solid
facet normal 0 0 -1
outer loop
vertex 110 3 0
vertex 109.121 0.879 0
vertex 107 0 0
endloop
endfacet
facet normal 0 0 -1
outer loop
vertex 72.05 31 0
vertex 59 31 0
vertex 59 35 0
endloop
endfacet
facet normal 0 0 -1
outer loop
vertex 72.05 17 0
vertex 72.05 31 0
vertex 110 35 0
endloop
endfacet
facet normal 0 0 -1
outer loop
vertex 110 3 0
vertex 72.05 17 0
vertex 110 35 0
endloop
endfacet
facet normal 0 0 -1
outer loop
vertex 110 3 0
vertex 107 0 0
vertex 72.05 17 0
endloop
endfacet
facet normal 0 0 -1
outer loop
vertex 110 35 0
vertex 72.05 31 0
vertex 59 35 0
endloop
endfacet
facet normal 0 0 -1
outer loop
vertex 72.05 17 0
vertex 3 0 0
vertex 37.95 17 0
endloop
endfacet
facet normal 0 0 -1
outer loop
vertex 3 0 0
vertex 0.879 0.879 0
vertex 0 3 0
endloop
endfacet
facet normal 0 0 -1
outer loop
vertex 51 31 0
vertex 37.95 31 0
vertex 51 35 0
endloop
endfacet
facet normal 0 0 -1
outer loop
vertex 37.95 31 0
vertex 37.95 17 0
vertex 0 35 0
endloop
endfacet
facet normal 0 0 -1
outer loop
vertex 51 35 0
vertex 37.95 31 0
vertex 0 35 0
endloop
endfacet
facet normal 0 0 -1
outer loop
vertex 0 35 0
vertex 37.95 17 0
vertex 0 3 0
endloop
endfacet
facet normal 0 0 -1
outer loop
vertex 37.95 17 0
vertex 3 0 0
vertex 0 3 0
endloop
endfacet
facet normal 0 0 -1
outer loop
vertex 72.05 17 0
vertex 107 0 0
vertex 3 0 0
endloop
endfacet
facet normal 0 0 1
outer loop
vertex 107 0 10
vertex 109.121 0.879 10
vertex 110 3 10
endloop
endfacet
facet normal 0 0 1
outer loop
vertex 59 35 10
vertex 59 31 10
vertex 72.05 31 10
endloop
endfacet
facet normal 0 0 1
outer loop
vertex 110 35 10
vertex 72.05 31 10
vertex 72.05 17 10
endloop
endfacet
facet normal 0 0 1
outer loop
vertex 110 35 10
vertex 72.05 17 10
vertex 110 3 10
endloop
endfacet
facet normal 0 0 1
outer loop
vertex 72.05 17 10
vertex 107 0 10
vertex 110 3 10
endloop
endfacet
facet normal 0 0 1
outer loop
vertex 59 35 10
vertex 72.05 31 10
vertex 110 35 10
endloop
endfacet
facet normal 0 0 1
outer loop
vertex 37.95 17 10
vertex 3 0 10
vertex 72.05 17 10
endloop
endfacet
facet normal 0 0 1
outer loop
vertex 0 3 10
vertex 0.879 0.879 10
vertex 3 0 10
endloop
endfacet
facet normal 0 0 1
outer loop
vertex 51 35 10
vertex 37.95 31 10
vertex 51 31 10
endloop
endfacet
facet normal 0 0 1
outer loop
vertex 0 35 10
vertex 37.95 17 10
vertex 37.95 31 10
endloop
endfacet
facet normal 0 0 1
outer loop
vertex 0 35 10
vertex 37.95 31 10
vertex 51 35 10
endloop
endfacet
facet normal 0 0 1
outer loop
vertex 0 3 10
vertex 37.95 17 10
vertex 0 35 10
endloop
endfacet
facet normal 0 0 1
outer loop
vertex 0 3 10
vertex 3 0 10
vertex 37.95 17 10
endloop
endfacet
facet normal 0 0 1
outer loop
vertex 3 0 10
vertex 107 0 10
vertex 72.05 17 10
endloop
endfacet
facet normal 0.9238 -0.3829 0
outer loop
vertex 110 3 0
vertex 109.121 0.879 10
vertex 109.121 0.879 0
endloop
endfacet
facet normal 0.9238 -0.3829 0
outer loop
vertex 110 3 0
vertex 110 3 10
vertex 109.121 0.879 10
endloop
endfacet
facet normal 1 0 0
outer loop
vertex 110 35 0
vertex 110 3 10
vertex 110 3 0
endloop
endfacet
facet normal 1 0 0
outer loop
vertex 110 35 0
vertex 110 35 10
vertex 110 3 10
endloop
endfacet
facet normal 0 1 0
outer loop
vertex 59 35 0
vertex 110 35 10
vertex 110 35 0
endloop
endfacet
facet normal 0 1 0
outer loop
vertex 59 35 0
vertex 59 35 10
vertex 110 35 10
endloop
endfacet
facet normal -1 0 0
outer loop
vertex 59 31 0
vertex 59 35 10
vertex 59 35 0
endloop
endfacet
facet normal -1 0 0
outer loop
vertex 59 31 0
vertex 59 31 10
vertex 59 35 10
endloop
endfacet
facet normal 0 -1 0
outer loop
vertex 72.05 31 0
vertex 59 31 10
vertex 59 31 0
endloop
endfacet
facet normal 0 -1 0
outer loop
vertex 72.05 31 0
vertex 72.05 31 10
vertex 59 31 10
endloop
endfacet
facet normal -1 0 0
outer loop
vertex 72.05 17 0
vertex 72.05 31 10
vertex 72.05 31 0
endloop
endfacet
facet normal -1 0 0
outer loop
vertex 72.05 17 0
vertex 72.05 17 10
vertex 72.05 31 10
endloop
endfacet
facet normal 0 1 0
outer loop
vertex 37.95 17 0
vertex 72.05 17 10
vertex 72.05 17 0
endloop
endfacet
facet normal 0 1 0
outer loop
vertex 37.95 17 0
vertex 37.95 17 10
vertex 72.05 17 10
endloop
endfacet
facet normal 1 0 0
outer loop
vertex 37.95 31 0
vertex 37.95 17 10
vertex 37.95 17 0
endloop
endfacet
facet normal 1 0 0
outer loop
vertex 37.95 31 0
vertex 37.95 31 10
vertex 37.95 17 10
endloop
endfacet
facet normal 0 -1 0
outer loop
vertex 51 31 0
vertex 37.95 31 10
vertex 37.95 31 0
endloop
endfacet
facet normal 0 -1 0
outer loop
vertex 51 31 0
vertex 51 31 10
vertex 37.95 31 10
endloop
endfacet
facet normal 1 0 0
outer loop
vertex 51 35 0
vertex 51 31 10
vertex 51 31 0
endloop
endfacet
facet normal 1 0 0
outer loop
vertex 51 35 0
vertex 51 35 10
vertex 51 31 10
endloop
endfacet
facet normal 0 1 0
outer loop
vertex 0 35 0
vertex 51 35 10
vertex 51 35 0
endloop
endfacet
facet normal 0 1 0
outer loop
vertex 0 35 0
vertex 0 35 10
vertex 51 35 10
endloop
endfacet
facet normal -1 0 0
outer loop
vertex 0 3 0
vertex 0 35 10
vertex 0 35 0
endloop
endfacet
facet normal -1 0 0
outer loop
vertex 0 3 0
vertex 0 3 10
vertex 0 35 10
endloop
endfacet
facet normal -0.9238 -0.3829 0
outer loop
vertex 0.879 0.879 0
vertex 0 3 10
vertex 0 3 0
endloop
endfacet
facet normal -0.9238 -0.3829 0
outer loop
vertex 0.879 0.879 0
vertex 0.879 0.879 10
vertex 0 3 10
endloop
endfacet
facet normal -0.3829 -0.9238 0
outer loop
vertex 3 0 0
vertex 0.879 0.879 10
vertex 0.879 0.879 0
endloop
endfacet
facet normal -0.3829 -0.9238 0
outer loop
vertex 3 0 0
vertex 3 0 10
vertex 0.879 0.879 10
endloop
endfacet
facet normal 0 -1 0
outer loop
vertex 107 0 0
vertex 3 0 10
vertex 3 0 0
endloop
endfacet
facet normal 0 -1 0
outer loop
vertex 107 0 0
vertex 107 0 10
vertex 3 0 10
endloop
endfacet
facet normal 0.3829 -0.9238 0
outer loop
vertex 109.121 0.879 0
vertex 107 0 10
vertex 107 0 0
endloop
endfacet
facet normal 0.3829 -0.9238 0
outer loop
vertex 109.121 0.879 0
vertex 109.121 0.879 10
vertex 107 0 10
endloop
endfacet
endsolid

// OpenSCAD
$fn = 32;

// ----------------------------------------------------------------------
// Window plate: 110 x 35 mm, 1 open windows
// ----------------------------------------------------------------------

// --- parameters (mm) ---
profile_height = 10;      // extrusion height
profile_points = 16;      // points of the closed outline

profile = [[0, 3], [0.879, 0.879], [3, 0], [107, 0], [109.121, 0.879], [110, 3], [110, 35], [59, 35], [59, 31], [72.05, 31], [72.05, 17], [37.95, 17], [37.95, 31], [51, 31], [51, 35], [0, 35]];  // single closed polygon, 16 points, counter clockwise

// --- the one profile operation ---
linear_extrude(height = profile_height) polygon(points = profile);
